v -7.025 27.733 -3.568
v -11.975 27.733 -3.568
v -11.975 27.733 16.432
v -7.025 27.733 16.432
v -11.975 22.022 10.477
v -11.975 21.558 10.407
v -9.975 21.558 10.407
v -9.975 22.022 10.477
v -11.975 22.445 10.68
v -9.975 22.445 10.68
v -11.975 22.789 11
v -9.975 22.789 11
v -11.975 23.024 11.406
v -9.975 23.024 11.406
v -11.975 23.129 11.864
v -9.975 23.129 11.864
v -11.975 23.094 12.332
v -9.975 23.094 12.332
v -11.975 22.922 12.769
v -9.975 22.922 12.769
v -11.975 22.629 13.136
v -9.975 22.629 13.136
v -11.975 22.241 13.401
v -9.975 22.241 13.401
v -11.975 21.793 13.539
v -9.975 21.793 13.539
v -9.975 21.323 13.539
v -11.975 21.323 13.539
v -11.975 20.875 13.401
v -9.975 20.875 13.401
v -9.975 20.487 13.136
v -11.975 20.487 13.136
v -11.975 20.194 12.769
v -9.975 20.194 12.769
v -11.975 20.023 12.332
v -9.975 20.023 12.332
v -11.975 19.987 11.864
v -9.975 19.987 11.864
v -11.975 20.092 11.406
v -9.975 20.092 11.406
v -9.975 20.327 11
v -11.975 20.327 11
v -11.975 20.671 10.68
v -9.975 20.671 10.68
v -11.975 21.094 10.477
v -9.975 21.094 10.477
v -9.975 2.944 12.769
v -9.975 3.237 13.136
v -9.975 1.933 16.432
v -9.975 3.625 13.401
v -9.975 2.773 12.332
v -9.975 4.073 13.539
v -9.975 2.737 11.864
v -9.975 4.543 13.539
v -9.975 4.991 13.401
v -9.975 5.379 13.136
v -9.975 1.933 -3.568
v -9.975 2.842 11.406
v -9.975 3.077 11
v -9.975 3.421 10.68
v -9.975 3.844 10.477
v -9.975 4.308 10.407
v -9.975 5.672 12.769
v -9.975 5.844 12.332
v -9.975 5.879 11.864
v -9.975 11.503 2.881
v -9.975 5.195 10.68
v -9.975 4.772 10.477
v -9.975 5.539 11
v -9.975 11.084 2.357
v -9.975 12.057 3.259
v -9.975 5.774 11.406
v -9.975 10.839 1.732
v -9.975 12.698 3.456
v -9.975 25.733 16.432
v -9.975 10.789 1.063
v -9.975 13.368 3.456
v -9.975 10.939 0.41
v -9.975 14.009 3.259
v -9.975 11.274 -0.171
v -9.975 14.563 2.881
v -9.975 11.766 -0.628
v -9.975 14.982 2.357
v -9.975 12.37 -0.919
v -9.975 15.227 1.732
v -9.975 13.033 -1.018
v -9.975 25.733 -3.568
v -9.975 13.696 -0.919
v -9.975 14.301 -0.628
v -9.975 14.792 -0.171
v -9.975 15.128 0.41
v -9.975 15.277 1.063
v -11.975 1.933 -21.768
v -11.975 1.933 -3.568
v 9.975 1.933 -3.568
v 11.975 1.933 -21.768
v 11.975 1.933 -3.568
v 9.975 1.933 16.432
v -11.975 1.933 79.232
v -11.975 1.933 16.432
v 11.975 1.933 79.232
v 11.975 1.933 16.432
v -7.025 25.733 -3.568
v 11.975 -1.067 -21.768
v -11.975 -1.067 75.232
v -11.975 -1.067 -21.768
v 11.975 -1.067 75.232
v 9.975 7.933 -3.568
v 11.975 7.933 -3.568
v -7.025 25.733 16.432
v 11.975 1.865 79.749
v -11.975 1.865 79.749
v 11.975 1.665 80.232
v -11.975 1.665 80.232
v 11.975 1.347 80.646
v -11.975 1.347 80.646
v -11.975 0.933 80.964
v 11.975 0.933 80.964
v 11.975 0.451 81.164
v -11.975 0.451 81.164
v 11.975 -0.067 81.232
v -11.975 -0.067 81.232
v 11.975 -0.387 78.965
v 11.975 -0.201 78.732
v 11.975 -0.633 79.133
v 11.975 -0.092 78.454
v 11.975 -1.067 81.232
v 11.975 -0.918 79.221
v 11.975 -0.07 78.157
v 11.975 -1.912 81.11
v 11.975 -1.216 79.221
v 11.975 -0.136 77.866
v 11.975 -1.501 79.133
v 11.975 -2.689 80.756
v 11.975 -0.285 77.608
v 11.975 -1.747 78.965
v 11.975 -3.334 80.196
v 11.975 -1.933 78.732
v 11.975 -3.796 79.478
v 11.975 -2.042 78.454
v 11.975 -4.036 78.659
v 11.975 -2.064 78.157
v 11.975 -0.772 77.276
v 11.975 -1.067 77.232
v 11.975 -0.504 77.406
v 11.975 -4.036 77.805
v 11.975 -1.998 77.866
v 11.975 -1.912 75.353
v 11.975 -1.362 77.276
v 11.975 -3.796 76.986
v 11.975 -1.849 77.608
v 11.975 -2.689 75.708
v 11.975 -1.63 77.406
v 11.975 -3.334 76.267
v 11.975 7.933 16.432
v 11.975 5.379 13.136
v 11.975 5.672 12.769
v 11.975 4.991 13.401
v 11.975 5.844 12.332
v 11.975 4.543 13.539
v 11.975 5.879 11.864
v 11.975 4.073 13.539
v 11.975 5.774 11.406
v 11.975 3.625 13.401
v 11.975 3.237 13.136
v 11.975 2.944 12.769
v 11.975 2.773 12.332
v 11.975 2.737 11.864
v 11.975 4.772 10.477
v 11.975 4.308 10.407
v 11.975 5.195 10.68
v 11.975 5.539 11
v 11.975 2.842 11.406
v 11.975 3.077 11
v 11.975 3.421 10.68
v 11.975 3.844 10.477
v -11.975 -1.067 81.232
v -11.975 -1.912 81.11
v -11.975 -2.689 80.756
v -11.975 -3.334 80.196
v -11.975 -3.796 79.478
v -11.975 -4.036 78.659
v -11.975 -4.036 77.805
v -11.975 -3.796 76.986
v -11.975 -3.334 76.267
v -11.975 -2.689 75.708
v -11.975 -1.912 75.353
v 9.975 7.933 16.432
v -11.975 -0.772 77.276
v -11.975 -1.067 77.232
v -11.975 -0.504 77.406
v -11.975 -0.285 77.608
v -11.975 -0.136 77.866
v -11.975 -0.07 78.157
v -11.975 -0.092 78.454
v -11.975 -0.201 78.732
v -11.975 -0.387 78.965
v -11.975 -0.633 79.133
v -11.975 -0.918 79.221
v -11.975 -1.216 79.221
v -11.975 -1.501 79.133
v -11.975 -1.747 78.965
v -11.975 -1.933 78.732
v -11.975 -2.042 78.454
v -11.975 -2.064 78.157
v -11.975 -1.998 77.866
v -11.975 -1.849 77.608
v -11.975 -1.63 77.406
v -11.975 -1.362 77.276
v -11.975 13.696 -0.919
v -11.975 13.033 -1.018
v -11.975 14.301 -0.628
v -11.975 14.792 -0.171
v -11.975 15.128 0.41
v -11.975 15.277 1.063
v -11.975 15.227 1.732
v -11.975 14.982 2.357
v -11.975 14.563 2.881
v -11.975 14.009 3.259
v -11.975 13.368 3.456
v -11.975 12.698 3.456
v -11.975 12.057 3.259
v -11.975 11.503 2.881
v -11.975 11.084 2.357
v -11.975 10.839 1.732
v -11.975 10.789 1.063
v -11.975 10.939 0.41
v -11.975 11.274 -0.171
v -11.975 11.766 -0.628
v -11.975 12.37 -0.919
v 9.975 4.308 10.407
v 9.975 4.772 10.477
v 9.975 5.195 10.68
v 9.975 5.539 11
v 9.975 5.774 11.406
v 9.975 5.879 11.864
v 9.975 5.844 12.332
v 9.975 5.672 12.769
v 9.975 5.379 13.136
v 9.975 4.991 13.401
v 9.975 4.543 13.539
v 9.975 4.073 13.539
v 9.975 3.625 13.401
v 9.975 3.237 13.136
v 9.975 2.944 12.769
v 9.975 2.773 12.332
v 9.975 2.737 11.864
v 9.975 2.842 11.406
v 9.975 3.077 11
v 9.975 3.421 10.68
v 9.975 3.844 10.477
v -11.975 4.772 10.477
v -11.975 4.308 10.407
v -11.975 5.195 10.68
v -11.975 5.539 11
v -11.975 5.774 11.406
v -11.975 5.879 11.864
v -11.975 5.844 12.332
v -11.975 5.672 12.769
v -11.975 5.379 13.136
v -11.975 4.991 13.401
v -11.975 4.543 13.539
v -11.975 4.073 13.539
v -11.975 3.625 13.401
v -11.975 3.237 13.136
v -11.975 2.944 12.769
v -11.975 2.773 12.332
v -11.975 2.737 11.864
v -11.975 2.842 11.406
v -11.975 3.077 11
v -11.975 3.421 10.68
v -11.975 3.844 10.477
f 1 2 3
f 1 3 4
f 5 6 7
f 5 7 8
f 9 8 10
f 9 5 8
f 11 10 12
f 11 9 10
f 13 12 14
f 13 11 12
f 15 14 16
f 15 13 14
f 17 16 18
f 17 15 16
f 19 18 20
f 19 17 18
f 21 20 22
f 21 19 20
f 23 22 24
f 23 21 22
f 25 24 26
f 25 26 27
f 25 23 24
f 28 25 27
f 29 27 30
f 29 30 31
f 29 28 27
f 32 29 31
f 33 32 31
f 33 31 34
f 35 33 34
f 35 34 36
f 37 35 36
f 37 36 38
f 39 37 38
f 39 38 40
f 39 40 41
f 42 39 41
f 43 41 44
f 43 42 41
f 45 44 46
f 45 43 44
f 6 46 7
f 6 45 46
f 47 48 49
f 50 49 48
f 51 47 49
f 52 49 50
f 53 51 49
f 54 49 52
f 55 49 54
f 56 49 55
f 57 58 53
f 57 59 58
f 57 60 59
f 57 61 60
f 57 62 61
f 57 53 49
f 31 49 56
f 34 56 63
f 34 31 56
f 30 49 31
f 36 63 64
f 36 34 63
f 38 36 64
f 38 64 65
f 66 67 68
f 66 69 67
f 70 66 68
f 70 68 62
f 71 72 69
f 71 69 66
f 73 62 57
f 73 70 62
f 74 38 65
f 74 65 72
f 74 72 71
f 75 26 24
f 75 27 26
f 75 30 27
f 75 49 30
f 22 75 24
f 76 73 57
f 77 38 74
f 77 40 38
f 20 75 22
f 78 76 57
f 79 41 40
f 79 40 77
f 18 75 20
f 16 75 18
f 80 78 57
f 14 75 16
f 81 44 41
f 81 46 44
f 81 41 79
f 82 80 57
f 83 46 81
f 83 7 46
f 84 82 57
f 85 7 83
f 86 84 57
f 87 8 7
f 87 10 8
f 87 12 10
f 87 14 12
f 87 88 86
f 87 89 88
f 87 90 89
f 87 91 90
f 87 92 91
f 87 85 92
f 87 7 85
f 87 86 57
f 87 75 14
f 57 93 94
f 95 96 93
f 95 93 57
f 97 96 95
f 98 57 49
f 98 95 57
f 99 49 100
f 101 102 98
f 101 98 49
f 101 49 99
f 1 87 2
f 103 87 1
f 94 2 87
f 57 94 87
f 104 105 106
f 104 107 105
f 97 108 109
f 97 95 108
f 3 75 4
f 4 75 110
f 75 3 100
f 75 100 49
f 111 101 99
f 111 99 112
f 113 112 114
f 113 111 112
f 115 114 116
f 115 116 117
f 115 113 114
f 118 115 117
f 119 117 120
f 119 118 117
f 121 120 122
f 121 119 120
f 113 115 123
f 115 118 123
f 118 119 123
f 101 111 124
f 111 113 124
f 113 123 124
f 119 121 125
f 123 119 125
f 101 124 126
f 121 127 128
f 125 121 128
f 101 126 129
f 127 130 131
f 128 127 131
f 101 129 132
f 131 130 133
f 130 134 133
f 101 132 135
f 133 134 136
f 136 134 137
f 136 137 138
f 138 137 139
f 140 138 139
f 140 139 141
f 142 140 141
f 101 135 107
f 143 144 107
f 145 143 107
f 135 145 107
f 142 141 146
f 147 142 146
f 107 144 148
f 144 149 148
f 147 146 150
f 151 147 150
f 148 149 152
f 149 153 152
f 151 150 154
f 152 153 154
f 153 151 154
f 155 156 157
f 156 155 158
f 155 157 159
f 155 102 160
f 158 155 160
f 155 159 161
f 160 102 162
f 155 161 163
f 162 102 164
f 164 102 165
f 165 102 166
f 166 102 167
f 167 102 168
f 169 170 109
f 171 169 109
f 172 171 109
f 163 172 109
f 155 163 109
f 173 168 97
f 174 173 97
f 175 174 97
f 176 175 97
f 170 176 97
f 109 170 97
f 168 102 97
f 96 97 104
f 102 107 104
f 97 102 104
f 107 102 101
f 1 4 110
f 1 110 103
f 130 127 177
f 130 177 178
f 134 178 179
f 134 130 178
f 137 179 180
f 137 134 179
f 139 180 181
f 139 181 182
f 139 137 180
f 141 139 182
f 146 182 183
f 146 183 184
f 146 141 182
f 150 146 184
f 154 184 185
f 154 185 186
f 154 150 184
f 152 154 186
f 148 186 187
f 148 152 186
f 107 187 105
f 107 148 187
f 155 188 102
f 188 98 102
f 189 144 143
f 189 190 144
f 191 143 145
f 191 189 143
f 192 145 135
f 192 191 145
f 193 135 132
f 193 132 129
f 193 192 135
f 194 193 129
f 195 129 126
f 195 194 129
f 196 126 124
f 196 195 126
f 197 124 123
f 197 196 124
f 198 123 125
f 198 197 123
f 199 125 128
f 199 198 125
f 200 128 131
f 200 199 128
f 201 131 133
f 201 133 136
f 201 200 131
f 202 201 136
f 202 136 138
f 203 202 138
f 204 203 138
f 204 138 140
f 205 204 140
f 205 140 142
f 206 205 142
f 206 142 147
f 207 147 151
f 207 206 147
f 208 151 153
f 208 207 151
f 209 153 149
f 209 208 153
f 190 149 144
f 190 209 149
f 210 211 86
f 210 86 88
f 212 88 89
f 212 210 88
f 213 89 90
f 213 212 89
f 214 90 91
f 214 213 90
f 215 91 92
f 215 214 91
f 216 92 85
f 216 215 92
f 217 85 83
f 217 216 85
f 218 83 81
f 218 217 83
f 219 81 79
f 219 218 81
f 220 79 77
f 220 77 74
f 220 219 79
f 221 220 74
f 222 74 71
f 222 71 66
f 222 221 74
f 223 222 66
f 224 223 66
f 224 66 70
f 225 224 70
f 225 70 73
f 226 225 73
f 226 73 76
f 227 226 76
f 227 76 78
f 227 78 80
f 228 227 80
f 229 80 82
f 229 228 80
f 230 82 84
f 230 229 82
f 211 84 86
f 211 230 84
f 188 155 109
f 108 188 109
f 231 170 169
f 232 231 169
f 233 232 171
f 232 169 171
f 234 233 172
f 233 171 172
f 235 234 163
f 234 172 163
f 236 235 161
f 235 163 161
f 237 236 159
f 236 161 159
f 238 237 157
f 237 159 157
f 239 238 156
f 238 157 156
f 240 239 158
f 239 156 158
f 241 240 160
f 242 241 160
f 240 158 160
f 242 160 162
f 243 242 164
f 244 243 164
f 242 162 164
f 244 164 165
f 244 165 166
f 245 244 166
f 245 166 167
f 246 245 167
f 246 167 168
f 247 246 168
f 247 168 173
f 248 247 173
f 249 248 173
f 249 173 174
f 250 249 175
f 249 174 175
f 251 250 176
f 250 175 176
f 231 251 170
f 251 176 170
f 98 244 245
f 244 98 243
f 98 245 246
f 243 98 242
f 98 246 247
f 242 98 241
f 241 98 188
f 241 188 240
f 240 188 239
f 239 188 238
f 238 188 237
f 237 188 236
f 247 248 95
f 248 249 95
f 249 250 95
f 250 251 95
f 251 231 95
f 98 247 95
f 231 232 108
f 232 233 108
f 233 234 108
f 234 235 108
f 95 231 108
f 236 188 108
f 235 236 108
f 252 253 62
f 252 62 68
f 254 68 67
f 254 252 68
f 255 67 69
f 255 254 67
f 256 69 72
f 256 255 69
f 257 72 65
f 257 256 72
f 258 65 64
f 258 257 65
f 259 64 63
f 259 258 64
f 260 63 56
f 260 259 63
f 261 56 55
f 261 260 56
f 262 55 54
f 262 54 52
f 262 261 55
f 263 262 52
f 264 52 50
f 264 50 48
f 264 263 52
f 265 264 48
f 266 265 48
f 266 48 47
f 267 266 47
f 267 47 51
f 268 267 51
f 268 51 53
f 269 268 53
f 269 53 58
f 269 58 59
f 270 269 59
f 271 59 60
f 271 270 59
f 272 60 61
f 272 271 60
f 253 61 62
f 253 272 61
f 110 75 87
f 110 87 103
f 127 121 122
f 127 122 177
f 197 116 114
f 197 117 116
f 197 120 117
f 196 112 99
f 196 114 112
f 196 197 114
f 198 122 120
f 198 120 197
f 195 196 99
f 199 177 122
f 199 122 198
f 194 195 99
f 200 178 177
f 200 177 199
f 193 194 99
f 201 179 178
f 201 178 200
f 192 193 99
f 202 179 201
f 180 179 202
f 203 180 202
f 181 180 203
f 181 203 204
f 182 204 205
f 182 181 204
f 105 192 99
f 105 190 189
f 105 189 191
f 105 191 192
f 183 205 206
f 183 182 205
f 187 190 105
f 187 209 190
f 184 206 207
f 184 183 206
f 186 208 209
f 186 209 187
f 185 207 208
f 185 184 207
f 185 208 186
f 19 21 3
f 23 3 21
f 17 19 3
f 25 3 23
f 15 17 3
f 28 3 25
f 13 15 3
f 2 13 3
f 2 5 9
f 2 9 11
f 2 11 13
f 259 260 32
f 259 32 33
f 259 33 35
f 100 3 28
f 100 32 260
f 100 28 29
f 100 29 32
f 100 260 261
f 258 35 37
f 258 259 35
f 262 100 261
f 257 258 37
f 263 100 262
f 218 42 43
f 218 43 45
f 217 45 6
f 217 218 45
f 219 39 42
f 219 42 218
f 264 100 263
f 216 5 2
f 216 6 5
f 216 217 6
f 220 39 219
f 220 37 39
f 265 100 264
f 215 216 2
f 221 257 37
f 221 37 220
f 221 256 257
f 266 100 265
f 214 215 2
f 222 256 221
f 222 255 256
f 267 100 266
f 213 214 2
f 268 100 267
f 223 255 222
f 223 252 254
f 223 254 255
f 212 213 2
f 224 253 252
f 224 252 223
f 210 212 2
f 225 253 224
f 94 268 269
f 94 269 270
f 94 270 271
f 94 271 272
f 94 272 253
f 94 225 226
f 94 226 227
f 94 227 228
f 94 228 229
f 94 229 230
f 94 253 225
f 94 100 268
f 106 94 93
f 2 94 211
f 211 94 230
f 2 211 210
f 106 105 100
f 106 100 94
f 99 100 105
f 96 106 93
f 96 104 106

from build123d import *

# Parameters (mm, degrees)
SKETCH1_R           = 1
BOSS_EXTRUDE1_DEPTH = 11.975
SKETCH2_W           = 20
SKETCH2_H           = 23.8
SKETCH2_R           = 1.575
SKETCH2_R_2         = 2.25
BOSS_EXTRUDE2_DEPTH = 2
SKETCH3_W           = 23.95
SKETCH3_H           = 20
BOSS_EXTRUDE3_DEPTH = 2
SKETCH4_W           = 20
SKETCH4_H           = 19.8
CUT_EXTRUDE1_DEPTH  = 19


with BuildPart() as part:
    # Sketch1 → Boss-Extrude1 (new, symmetric)
    with BuildSketch(Plane(origin=(0, 0, 0), x_dir=(0, 0, -1), z_dir=(1, 0, 0))):
        with BuildLine():
            Line((21.768222654, 1.933048137), (-79.231777346, 1.933048137))
            ThreePointArc((-79.231777346, 1.933048137), (-80.645990908, 1.347261699), (-81.231777346, -0.066951863))
            Line((-81.231777346, -0.066951863), (-81.231777346, -1.066951863))
            ThreePointArc((-81.231777346, -1.066951863), (-78.231777346, -4.066951863), (-75.231777346, -1.066951863))
            Line((-75.231777346, -1.066951863), (21.768222654, -1.066951863))
            Line((21.768222654, -1.066951863), (21.768222654, 1.933048137))
        make_face()
        with Locations((-78.231777346, -1.066951863)):
            Circle(SKETCH1_R, mode=Mode.SUBTRACT)
    extrude(amount=BOSS_EXTRUDE1_DEPTH, both=True)

    # Sketch2 → Boss-Extrude2 (add)
    with BuildSketch(Plane(origin=(11.975, 0, 0), x_dir=(0, 0, -1), z_dir=(1, 0, 0))):
        with Locations((-6.431536694, 13.833048137)):
            Rectangle(SKETCH2_W, SKETCH2_H)
        with Locations((-11.981536694, 4.308048137)):
            Circle(SKETCH2_R, mode=Mode.SUBTRACT)
        with Locations((-11.981536694, 21.558048137)):
            Circle(SKETCH2_R, mode=Mode.SUBTRACT)
        with Locations((-1.231536694, 13.033048137)):
            Circle(SKETCH2_R_2, mode=Mode.SUBTRACT)
    boss_extrude2 = extrude(amount=-BOSS_EXTRUDE2_DEPTH)

    # Mirror1: Boss-Extrude2 across plane
    add(boss_extrude2.mirror(Plane(origin=(0, 0, 0), x_dir=(0, 0, 1), z_dir=(1, 0, 0))))

    # Sketch3 → Boss-Extrude3 (add)
    with BuildSketch(Plane(origin=(0, 25.733048137, 0), x_dir=(1, 0, 0), z_dir=(0, 1, 0))):
        with Locations((0, -6.431536694)):
            Rectangle(SKETCH3_W, SKETCH3_H)
    extrude(amount=BOSS_EXTRUDE3_DEPTH)

    # Sketch4 → Cut-Extrude1 (cut)
    with BuildSketch(Plane(origin=(11.975, 0, 0), x_dir=(0, 0, -1), z_dir=(1, 0, 0))):
        with Locations((-6.431536694, 17.833048137)):
            Rectangle(SKETCH4_W, SKETCH4_H)
    extrude(amount=-CUT_EXTRUDE1_DEPTH, mode=Mode.SUBTRACT)


solid = part.part
